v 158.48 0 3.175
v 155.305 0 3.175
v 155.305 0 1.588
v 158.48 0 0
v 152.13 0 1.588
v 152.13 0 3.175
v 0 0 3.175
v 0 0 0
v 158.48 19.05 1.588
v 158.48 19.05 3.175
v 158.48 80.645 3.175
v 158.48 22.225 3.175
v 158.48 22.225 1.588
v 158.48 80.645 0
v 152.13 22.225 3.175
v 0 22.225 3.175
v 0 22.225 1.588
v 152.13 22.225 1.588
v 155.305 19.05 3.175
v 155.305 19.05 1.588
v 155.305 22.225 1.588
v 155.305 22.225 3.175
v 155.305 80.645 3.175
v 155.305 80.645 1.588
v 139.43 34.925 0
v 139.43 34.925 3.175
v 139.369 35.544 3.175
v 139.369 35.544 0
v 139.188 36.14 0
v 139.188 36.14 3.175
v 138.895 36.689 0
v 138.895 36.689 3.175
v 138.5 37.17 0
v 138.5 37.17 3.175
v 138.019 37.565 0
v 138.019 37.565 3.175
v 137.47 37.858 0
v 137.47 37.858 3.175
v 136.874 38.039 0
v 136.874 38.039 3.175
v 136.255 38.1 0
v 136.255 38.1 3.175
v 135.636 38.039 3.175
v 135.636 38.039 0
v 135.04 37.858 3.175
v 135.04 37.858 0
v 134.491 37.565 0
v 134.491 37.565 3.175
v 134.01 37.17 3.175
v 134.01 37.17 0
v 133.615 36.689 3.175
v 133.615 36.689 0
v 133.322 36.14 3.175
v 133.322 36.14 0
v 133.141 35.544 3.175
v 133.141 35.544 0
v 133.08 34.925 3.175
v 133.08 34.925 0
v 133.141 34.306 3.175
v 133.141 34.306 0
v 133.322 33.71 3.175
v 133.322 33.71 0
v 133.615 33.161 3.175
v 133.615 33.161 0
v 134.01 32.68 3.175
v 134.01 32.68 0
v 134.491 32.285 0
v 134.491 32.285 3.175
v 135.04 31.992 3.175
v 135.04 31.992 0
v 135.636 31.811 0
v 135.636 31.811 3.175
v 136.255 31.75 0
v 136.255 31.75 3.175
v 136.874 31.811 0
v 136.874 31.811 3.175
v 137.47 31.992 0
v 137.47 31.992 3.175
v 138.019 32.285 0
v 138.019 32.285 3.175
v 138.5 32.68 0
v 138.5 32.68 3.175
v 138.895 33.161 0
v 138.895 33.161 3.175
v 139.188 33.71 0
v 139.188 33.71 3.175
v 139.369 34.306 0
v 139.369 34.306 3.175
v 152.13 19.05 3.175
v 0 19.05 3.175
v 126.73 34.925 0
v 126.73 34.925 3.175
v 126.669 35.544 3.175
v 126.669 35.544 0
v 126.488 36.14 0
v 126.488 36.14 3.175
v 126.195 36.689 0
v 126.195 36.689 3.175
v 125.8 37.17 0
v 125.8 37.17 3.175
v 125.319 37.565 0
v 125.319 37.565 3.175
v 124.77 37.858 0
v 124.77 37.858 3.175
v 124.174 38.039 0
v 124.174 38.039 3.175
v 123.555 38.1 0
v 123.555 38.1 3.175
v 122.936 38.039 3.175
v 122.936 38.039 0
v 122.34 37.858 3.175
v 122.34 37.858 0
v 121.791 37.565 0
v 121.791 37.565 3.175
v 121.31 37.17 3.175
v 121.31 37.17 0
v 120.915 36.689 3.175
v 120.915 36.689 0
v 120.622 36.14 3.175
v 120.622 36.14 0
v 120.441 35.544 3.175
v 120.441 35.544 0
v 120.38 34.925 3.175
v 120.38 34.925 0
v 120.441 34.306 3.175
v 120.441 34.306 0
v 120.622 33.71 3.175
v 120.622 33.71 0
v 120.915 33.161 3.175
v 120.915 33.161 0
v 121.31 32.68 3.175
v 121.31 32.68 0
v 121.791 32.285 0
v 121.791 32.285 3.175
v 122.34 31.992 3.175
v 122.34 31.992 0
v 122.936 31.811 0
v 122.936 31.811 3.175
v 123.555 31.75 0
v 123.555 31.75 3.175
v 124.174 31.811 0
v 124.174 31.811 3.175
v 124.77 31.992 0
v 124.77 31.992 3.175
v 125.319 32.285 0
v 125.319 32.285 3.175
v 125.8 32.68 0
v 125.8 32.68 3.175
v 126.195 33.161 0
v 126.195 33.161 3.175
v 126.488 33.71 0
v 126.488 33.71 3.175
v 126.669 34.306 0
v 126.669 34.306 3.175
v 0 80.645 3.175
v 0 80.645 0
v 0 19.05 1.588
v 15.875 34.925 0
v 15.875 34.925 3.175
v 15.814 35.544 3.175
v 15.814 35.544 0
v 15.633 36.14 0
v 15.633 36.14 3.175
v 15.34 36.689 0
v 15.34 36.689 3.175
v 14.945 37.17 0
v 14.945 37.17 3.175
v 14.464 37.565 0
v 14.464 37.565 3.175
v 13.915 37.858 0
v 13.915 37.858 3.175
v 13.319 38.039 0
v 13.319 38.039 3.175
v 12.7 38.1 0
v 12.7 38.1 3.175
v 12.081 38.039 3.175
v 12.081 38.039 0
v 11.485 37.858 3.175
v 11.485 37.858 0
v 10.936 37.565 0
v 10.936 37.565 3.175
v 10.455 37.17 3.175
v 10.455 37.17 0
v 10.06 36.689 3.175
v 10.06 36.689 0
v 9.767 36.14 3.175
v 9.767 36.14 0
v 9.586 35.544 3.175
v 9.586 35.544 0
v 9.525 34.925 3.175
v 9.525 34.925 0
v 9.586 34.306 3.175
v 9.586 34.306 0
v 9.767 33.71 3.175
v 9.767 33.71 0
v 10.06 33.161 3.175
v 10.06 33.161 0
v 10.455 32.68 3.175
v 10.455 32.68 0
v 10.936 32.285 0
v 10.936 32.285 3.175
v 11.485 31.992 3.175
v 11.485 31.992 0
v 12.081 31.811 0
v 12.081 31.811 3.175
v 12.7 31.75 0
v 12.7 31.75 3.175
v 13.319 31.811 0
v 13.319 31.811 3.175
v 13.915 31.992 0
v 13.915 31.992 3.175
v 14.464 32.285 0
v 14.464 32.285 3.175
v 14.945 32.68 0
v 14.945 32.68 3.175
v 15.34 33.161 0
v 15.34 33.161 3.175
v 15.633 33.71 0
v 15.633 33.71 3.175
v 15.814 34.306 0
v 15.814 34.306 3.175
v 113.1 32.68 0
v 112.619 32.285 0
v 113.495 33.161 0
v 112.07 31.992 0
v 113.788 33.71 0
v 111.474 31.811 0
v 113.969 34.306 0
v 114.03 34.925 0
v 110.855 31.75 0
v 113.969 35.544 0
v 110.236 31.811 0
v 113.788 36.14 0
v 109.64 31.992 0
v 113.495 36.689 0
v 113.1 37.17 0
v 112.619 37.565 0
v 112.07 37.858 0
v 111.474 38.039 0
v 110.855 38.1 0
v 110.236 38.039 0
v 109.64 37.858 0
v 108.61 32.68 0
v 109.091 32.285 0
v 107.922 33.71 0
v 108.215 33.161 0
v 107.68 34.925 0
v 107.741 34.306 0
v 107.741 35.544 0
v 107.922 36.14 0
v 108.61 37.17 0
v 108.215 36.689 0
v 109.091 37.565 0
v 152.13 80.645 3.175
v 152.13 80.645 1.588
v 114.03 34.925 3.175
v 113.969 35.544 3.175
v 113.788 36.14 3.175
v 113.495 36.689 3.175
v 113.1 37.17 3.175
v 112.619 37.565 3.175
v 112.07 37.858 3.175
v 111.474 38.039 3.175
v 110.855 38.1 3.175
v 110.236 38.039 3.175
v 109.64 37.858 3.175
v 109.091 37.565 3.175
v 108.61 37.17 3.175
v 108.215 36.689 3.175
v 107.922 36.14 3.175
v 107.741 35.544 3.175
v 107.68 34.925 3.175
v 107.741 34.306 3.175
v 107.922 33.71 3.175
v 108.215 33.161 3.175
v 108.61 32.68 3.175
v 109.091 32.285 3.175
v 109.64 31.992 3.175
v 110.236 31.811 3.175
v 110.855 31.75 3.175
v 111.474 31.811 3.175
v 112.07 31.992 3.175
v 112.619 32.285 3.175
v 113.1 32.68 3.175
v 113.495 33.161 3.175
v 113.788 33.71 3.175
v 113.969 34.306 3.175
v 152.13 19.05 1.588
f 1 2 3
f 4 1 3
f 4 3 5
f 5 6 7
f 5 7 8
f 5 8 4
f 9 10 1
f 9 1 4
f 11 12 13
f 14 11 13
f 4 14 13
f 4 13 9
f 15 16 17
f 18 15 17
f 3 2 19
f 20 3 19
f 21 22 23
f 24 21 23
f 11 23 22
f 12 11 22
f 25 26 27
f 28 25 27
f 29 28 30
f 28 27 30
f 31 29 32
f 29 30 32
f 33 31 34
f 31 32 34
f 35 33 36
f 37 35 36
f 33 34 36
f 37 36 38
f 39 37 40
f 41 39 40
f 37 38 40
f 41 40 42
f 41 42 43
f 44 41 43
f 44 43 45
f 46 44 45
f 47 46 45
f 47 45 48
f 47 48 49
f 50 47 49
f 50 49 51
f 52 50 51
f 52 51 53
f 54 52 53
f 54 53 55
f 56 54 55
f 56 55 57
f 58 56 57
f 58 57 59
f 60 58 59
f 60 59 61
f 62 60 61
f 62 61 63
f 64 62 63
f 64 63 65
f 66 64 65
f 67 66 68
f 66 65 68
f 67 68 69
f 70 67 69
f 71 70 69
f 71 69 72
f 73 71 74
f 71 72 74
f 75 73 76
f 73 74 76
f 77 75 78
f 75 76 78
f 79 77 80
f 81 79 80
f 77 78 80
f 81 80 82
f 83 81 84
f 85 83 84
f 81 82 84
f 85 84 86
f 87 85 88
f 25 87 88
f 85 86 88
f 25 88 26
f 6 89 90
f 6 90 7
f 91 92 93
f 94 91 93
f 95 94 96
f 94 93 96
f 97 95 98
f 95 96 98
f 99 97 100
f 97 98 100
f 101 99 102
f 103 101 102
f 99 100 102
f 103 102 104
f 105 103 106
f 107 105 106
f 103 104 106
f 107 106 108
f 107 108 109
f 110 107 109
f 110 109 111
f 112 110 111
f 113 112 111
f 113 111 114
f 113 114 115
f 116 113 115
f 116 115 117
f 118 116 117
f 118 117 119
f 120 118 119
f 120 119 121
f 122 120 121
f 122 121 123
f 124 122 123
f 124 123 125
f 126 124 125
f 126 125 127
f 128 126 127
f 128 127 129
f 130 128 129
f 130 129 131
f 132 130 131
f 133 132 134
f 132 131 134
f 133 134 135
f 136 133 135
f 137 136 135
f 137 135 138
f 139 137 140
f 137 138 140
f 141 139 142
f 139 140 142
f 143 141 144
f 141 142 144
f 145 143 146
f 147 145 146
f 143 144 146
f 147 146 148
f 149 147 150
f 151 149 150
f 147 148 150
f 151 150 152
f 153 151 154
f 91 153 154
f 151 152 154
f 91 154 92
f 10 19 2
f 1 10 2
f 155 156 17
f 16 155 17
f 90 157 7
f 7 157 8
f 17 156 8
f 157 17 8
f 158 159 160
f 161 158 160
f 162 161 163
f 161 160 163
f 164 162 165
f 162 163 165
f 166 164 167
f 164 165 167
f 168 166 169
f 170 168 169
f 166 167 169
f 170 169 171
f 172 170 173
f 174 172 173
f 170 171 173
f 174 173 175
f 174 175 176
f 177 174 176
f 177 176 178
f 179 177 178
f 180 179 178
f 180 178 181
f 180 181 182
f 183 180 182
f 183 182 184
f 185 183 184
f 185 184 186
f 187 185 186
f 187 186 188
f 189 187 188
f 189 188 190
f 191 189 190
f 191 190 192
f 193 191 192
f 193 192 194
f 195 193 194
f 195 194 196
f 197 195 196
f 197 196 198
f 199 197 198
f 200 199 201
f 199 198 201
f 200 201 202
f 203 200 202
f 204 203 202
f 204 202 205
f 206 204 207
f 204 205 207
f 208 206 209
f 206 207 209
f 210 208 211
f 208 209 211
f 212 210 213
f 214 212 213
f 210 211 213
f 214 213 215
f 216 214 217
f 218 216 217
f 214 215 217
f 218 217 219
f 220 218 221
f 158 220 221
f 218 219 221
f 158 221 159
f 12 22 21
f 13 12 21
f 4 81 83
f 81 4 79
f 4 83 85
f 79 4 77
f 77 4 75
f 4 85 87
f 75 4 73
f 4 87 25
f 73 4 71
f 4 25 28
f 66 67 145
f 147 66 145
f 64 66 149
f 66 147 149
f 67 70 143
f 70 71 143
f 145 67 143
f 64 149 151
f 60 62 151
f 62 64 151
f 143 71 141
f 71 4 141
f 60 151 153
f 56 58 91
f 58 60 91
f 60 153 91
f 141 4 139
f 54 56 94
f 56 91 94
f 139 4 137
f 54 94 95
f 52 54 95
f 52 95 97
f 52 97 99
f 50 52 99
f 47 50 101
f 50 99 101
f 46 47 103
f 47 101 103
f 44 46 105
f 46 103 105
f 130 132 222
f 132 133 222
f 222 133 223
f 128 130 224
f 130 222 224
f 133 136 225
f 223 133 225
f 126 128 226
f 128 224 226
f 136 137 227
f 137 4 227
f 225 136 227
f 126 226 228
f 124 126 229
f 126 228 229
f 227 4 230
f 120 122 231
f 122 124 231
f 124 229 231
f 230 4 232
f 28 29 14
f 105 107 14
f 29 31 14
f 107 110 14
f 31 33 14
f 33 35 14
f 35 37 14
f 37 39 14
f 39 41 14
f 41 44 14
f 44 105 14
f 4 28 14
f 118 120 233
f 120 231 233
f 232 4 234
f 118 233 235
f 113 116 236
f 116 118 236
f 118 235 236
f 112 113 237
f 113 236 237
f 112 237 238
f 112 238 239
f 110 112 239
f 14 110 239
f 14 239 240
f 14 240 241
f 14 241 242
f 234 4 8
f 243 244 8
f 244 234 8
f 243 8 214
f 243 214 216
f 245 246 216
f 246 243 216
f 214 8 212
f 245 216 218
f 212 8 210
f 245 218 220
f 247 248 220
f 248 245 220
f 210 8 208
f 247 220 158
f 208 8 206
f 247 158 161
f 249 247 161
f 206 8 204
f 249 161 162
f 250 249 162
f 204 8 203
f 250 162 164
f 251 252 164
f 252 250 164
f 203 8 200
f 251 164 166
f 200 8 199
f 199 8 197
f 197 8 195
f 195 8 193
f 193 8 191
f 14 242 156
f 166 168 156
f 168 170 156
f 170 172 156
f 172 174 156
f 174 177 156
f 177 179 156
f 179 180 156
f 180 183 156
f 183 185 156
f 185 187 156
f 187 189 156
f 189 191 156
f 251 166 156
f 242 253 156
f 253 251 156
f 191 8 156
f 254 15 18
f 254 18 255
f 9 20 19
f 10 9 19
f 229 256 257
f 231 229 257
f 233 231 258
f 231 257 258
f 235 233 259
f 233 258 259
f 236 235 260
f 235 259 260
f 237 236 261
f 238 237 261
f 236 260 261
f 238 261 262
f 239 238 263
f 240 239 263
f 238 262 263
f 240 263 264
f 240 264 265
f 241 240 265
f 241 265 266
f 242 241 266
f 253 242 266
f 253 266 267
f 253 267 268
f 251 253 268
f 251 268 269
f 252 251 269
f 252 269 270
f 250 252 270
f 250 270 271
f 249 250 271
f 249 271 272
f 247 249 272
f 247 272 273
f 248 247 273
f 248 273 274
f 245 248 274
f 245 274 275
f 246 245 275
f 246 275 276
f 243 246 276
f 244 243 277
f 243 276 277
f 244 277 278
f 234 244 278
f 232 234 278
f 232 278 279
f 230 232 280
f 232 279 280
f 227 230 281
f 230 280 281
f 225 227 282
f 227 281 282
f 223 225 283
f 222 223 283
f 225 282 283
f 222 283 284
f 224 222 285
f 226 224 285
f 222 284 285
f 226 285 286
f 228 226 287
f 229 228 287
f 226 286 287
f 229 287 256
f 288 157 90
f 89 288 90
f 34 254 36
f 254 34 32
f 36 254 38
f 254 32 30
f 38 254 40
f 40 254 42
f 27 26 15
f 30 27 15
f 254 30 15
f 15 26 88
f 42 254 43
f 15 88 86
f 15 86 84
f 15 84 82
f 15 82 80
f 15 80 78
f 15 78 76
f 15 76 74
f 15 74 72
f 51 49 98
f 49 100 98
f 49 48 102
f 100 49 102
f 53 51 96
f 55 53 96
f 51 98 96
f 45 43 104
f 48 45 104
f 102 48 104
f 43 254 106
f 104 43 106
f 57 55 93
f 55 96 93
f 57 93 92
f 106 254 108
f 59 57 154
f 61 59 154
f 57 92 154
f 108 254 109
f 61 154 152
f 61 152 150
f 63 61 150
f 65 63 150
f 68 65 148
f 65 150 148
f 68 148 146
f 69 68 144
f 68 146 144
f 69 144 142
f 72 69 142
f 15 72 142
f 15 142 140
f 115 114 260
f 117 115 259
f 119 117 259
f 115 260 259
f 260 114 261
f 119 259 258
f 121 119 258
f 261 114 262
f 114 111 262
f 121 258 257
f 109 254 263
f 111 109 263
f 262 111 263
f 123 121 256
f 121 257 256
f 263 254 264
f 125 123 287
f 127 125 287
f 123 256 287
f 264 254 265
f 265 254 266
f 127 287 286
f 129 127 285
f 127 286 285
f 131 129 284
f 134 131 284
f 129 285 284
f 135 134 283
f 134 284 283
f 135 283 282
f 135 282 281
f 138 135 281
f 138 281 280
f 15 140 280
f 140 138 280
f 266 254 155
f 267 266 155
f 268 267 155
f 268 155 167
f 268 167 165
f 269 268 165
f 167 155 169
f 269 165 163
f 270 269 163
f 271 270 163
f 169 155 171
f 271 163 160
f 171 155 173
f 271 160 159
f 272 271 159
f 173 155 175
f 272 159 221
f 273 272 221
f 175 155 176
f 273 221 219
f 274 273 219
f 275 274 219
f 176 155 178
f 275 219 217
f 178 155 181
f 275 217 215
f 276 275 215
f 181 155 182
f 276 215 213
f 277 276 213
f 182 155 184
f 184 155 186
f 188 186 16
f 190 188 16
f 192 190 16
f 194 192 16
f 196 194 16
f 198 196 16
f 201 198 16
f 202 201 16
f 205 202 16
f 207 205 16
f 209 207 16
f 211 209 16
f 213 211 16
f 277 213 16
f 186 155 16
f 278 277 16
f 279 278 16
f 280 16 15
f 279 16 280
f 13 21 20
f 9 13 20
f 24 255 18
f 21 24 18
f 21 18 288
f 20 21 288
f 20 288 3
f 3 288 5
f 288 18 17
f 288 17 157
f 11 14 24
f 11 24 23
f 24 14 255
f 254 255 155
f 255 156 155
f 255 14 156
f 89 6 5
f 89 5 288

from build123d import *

# Parameters (mm, degrees)
BOSS_EXTRUDE1_DEPTH = 3.175
SKETCH2_W           = 1.5875
SKETCH2_H           = 3.175
CUT_EXTRUDE1_DEPTH  = 170.414546822
SKETCH3_R           = 3.175
CUT_EXTRUDE2_DEPTH  = 170.414546822
BOSS_EXTRUDE2_DEPTH = 9.525
SKETCH5_W           = 3.175
SKETCH5_H           = 80.645
CUT_EXTRUDE3_DEPTH  = 1.5875


with BuildPart() as part:
    # Sketch1 → Boss-Extrude1 (new body)
    with BuildSketch(Plane.XY):
        Polygon((89.265, 0), (148.955, 0), (148.955, 80.645), (0, 80.645), (0, 0), align=None)
    extrude(amount=BOSS_EXTRUDE1_DEPTH)

    # Sketch2 → Cut-Extrude1 (cut, through all)
    with BuildSketch(Plane(origin=(148.955, 0, 0), x_dir=(0, 0, -1), z_dir=(1, 0, 0))):
        with Locations((-2.38125, 20.6375)):
            Rectangle(SKETCH2_W, SKETCH2_H)
    extrude(amount=-CUT_EXTRUDE1_DEPTH, mode=Mode.SUBTRACT)

    # Sketch3 → Cut-Extrude2 (cut, through all)
    with BuildSketch(Plane.XY.offset(3.175)):
        with Locations((12.7, 34.925)):
            Circle(SKETCH3_R)
        with Locations((136.255, 34.925)):
            Circle(SKETCH3_R)
        with Locations((123.555, 34.925)):
            Circle(SKETCH3_R)
        with Locations((110.855, 34.925)):
            Circle(SKETCH3_R)
    extrude(amount=-CUT_EXTRUDE2_DEPTH, mode=Mode.SUBTRACT)

    # Sketch4 → Boss-Extrude2 (add)
    with BuildSketch(Plane(origin=(148.955, 0, 0), x_dir=(0, 0, -1), z_dir=(1, 0, 0))):
        Polygon((-3.175, 19.05), (-3.175, 0), (0, 0), (0, 80.645), (-3.175, 80.645), (-3.175, 22.225), (-1.5875, 22.225), (-1.5875, 19.05), align=None)
    extrude(amount=BOSS_EXTRUDE2_DEPTH)

    # Sketch5 → Cut-Extrude3 (cut)
    with BuildSketch(Plane.XY.offset(3.175)):
        with Locations((153.7175, 40.3225)):
            Rectangle(SKETCH5_W, SKETCH5_H)
    extrude(amount=-CUT_EXTRUDE3_DEPTH, mode=Mode.SUBTRACT)


solid = part.part
